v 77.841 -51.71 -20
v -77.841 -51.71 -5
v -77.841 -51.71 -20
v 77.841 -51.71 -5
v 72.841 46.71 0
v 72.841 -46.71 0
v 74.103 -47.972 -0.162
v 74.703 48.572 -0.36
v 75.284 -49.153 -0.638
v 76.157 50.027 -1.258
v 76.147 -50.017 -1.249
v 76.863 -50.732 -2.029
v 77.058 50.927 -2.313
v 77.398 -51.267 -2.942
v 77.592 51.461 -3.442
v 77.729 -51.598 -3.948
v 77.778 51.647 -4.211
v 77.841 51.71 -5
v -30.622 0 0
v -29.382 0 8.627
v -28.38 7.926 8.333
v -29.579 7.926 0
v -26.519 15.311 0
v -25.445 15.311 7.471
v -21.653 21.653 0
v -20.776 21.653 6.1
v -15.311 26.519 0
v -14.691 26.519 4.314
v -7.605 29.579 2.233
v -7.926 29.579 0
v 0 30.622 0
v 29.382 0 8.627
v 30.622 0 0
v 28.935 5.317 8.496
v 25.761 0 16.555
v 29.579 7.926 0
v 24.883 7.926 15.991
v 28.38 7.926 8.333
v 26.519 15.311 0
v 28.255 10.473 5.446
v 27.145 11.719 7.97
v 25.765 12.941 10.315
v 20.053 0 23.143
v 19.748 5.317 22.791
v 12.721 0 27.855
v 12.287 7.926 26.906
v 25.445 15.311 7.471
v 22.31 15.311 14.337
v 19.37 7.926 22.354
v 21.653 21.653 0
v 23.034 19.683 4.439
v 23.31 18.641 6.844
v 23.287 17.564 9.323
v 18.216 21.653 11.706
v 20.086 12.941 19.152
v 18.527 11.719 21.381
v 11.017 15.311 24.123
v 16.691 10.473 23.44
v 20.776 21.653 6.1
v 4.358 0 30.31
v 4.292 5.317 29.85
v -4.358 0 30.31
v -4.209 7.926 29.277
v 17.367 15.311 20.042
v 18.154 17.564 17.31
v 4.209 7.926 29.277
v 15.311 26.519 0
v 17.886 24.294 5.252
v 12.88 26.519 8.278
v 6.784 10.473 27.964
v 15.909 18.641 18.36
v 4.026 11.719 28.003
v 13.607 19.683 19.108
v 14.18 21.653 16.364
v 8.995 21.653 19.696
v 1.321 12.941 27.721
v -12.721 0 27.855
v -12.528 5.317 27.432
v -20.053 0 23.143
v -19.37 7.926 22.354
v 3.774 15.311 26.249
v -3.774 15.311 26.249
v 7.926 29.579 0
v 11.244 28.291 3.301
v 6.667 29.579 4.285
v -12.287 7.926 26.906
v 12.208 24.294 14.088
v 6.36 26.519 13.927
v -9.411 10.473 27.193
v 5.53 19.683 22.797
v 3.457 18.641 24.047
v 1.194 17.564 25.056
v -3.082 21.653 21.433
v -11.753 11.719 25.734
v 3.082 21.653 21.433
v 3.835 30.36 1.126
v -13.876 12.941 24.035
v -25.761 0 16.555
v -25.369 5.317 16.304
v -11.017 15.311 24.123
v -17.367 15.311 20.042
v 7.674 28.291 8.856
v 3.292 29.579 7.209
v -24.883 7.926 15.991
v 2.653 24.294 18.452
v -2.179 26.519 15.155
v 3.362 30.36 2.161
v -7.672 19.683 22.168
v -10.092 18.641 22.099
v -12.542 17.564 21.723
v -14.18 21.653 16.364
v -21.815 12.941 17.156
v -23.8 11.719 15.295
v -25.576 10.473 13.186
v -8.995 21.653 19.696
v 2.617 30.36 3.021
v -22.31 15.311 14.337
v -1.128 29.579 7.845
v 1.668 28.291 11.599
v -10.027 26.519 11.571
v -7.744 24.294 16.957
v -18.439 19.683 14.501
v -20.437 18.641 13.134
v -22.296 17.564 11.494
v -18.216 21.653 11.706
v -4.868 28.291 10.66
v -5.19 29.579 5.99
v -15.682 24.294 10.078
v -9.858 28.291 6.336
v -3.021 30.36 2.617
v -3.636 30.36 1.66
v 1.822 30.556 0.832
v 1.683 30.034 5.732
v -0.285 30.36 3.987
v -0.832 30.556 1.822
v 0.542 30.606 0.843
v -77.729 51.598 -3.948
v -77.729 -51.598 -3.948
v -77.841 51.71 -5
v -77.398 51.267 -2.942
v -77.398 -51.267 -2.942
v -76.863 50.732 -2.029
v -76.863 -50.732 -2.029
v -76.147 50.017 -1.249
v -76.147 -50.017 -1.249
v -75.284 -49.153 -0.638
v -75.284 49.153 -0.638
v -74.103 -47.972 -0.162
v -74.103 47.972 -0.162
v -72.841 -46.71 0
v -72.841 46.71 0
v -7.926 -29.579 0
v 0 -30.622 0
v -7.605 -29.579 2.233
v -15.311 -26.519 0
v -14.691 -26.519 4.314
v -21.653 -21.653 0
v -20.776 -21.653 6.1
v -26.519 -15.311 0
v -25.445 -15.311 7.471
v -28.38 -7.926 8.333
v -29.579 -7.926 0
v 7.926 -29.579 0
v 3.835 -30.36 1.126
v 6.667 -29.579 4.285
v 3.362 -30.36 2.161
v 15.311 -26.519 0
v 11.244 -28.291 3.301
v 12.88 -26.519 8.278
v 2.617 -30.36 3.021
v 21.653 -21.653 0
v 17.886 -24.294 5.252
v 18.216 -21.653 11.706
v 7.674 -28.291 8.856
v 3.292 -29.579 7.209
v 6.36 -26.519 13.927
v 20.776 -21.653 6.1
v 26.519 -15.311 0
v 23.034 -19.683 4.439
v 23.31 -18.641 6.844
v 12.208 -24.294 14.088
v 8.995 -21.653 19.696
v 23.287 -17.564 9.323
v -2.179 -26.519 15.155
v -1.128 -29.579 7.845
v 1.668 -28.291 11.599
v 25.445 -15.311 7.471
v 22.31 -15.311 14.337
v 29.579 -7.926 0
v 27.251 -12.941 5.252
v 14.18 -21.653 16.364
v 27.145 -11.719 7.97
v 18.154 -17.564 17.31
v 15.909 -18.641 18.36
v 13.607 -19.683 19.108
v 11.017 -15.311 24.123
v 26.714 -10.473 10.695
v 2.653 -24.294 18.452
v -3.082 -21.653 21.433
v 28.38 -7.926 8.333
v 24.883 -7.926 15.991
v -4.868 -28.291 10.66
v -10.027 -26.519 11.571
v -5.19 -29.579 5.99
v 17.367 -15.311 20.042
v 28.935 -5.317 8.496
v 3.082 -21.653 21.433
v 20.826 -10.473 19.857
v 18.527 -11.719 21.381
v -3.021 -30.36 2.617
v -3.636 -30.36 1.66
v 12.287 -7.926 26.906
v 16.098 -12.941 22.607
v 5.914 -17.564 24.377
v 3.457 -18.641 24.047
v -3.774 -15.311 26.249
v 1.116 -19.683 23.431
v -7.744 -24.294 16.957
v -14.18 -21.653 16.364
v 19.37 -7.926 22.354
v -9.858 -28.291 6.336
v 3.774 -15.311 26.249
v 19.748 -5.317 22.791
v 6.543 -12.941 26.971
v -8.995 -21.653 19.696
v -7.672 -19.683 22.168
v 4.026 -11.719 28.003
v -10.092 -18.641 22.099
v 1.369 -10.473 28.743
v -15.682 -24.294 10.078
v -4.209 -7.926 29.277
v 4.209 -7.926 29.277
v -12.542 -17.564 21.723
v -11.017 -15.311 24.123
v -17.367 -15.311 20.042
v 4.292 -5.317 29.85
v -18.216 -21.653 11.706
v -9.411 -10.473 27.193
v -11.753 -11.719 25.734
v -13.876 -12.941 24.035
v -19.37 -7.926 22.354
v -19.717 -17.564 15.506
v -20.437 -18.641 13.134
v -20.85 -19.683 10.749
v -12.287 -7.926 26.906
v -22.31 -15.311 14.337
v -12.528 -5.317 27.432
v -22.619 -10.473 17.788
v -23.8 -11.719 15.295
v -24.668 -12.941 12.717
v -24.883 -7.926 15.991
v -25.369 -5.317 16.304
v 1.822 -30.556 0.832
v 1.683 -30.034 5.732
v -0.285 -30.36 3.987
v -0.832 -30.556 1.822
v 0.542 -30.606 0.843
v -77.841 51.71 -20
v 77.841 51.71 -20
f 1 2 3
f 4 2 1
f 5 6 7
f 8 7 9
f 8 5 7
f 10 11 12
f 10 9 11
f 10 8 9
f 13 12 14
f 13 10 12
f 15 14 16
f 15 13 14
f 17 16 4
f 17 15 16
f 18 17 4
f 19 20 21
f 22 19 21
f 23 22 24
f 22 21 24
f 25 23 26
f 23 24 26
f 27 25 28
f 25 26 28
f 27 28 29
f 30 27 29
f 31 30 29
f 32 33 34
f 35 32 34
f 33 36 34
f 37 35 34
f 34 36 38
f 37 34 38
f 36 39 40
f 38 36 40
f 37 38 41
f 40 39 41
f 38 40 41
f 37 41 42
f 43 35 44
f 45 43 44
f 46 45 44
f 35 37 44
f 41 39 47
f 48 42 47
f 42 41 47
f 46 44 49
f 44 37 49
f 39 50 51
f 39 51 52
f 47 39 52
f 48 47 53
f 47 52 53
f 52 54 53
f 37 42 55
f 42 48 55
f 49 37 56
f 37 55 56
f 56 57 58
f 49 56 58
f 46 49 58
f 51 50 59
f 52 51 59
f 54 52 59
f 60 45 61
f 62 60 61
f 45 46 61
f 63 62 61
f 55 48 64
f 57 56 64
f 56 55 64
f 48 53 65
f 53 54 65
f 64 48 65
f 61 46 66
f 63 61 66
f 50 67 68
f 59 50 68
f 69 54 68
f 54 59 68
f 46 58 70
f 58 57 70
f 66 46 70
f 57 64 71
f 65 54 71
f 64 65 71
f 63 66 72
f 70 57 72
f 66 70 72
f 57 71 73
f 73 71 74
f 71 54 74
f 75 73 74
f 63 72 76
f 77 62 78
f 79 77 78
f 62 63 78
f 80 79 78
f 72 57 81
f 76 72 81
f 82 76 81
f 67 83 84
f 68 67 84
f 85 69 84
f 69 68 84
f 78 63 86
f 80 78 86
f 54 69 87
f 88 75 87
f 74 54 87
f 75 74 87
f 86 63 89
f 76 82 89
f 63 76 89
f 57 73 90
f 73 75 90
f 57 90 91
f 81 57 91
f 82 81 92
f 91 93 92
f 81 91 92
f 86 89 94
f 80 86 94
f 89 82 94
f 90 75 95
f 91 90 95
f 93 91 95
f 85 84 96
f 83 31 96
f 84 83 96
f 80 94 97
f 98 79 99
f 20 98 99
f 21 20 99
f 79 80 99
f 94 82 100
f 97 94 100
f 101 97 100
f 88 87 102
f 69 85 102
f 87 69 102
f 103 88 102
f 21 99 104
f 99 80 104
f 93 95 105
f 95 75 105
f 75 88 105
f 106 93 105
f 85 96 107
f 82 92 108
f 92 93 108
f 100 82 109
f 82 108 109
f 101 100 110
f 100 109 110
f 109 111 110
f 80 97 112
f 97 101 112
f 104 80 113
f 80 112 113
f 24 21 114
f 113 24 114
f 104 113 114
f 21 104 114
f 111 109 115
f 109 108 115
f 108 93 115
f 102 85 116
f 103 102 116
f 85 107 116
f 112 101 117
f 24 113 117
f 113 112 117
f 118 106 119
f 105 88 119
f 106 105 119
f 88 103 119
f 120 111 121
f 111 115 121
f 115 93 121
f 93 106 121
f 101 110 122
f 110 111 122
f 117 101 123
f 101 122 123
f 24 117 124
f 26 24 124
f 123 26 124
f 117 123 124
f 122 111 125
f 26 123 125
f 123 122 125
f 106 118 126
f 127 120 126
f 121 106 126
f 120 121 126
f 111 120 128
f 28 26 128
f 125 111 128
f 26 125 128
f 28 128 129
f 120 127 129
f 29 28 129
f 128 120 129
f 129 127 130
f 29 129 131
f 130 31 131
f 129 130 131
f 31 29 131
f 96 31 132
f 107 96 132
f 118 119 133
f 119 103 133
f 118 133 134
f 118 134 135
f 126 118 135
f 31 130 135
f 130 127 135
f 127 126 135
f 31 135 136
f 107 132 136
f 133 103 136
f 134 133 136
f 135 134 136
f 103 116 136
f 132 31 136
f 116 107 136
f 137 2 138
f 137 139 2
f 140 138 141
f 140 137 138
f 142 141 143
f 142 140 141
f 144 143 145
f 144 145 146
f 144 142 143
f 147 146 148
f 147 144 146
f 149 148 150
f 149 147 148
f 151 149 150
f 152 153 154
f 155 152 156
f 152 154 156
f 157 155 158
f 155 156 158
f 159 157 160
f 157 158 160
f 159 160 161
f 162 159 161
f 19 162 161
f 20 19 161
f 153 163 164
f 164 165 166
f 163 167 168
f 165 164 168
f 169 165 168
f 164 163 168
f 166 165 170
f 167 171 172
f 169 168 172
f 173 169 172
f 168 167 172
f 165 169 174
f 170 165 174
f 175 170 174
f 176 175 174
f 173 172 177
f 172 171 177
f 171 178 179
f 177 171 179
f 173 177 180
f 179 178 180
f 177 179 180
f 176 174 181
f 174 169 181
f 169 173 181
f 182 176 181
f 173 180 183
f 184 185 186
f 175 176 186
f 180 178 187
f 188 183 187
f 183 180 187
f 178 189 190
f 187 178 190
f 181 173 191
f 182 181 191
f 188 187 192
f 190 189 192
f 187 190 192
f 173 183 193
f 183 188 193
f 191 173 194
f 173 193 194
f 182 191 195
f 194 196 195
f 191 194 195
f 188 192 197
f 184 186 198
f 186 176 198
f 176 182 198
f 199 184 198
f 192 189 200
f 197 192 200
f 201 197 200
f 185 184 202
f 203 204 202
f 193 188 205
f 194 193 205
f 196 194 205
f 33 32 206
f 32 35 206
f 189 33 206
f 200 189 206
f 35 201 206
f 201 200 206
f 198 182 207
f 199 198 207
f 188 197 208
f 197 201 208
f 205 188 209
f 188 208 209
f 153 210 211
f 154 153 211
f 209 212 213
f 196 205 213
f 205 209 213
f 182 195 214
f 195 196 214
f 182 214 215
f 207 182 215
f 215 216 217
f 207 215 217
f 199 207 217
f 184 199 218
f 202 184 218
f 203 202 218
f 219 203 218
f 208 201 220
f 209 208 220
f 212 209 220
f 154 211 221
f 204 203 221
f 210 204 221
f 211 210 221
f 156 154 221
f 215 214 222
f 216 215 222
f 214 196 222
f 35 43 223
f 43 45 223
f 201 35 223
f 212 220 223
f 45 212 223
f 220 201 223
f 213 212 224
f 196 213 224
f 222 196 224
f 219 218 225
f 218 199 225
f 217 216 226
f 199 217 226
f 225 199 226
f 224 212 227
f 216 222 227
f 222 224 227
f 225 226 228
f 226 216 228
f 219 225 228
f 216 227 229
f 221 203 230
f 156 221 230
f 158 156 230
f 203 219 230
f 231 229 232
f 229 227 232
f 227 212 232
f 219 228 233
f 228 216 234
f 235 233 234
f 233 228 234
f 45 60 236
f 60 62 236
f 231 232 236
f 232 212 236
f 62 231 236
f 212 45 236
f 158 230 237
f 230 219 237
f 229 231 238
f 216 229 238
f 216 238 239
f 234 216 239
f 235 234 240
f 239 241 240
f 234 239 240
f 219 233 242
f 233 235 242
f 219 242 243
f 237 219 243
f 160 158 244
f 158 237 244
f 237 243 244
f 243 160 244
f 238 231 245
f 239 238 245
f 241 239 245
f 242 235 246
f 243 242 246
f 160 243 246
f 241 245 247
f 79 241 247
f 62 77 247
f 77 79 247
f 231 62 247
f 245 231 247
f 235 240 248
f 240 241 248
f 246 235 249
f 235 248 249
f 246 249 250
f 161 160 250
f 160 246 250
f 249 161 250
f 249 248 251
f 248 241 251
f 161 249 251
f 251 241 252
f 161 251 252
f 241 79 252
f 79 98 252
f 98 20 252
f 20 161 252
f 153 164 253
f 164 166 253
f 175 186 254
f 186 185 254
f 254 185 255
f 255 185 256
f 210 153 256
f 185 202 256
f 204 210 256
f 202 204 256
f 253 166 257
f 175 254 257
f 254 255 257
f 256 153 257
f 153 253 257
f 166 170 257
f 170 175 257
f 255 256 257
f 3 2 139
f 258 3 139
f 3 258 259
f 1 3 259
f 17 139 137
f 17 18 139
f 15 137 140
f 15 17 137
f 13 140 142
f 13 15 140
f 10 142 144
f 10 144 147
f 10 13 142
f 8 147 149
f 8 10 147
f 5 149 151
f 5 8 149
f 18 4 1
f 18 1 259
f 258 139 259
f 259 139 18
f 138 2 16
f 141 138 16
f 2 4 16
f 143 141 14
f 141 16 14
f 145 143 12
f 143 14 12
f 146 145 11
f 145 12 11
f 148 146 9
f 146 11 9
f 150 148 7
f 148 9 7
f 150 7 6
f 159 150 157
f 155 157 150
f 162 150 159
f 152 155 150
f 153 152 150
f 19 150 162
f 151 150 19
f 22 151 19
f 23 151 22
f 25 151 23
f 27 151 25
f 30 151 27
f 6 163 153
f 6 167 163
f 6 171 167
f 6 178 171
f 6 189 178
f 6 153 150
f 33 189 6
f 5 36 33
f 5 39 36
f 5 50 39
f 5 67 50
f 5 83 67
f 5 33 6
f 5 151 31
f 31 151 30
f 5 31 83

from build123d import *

# Parameters (mm, degrees)
F0_W     = 155.681744
F0_H     = 103.419952
F1_DEPTH = 20
F2_ANGLE = -180
F3_R     = 5


with BuildPart() as f1:
    # F0 (on Top) → F1 (new body)
    with BuildSketch(Plane.XY):
        Rectangle(F0_W, F0_H)
        with BuildLine():
            ThreePointArc((0, 30.621955), (21.652992, 21.652992), (30.621955, 0))
            ThreePointArc((30.621955, 0), (21.652992, -21.652992), (0, -30.621955))
            ThreePointArc((0, -30.621955), (-30.621955, 0), (0, 30.621955))
        make_face(mode=Mode.SUBTRACT)
        with BuildLine():
            Line((0, -30.621955), (0, 30.621955))
            ThreePointArc((0, 30.621955), (-30.621955, 0), (0, -30.621955))
        make_face()
        with BuildLine():
            ThreePointArc((0, -30.621955), (21.652992, -21.652992), (30.621955, 0))
            ThreePointArc((30.621955, 0), (21.652992, 21.652992), (0, 30.621955))
            Line((0, 30.621955), (0, -30.621955))
        make_face()
    extrude(amount=-F1_DEPTH)

    # F0 (on Top) → F2 (revolve)
    with BuildSketch(Plane.XY):
        with BuildLine():
            ThreePointArc((0, -30.621955), (21.652992, -21.652992), (30.621955, 0))
            ThreePointArc((30.621955, 0), (21.652992, 21.652992), (0, 30.621955))
            Line((0, 30.621955), (0, -30.621955))
        make_face()
    revolve(axis=Axis((0, 0, 0), (0, 1, 0)), revolution_arc=F2_ANGLE)

    # F3
    f3_edges = [f1.edges().sort_by_distance(p)[0] for p in [
        (-77.840872, 0, 0),
        (0, -51.709976, 0),
        (77.840872, 0, 0),
        (0, 51.709976, 0),
    ]]
    fillet(f3_edges, radius=F3_R)


solid = f1.part
